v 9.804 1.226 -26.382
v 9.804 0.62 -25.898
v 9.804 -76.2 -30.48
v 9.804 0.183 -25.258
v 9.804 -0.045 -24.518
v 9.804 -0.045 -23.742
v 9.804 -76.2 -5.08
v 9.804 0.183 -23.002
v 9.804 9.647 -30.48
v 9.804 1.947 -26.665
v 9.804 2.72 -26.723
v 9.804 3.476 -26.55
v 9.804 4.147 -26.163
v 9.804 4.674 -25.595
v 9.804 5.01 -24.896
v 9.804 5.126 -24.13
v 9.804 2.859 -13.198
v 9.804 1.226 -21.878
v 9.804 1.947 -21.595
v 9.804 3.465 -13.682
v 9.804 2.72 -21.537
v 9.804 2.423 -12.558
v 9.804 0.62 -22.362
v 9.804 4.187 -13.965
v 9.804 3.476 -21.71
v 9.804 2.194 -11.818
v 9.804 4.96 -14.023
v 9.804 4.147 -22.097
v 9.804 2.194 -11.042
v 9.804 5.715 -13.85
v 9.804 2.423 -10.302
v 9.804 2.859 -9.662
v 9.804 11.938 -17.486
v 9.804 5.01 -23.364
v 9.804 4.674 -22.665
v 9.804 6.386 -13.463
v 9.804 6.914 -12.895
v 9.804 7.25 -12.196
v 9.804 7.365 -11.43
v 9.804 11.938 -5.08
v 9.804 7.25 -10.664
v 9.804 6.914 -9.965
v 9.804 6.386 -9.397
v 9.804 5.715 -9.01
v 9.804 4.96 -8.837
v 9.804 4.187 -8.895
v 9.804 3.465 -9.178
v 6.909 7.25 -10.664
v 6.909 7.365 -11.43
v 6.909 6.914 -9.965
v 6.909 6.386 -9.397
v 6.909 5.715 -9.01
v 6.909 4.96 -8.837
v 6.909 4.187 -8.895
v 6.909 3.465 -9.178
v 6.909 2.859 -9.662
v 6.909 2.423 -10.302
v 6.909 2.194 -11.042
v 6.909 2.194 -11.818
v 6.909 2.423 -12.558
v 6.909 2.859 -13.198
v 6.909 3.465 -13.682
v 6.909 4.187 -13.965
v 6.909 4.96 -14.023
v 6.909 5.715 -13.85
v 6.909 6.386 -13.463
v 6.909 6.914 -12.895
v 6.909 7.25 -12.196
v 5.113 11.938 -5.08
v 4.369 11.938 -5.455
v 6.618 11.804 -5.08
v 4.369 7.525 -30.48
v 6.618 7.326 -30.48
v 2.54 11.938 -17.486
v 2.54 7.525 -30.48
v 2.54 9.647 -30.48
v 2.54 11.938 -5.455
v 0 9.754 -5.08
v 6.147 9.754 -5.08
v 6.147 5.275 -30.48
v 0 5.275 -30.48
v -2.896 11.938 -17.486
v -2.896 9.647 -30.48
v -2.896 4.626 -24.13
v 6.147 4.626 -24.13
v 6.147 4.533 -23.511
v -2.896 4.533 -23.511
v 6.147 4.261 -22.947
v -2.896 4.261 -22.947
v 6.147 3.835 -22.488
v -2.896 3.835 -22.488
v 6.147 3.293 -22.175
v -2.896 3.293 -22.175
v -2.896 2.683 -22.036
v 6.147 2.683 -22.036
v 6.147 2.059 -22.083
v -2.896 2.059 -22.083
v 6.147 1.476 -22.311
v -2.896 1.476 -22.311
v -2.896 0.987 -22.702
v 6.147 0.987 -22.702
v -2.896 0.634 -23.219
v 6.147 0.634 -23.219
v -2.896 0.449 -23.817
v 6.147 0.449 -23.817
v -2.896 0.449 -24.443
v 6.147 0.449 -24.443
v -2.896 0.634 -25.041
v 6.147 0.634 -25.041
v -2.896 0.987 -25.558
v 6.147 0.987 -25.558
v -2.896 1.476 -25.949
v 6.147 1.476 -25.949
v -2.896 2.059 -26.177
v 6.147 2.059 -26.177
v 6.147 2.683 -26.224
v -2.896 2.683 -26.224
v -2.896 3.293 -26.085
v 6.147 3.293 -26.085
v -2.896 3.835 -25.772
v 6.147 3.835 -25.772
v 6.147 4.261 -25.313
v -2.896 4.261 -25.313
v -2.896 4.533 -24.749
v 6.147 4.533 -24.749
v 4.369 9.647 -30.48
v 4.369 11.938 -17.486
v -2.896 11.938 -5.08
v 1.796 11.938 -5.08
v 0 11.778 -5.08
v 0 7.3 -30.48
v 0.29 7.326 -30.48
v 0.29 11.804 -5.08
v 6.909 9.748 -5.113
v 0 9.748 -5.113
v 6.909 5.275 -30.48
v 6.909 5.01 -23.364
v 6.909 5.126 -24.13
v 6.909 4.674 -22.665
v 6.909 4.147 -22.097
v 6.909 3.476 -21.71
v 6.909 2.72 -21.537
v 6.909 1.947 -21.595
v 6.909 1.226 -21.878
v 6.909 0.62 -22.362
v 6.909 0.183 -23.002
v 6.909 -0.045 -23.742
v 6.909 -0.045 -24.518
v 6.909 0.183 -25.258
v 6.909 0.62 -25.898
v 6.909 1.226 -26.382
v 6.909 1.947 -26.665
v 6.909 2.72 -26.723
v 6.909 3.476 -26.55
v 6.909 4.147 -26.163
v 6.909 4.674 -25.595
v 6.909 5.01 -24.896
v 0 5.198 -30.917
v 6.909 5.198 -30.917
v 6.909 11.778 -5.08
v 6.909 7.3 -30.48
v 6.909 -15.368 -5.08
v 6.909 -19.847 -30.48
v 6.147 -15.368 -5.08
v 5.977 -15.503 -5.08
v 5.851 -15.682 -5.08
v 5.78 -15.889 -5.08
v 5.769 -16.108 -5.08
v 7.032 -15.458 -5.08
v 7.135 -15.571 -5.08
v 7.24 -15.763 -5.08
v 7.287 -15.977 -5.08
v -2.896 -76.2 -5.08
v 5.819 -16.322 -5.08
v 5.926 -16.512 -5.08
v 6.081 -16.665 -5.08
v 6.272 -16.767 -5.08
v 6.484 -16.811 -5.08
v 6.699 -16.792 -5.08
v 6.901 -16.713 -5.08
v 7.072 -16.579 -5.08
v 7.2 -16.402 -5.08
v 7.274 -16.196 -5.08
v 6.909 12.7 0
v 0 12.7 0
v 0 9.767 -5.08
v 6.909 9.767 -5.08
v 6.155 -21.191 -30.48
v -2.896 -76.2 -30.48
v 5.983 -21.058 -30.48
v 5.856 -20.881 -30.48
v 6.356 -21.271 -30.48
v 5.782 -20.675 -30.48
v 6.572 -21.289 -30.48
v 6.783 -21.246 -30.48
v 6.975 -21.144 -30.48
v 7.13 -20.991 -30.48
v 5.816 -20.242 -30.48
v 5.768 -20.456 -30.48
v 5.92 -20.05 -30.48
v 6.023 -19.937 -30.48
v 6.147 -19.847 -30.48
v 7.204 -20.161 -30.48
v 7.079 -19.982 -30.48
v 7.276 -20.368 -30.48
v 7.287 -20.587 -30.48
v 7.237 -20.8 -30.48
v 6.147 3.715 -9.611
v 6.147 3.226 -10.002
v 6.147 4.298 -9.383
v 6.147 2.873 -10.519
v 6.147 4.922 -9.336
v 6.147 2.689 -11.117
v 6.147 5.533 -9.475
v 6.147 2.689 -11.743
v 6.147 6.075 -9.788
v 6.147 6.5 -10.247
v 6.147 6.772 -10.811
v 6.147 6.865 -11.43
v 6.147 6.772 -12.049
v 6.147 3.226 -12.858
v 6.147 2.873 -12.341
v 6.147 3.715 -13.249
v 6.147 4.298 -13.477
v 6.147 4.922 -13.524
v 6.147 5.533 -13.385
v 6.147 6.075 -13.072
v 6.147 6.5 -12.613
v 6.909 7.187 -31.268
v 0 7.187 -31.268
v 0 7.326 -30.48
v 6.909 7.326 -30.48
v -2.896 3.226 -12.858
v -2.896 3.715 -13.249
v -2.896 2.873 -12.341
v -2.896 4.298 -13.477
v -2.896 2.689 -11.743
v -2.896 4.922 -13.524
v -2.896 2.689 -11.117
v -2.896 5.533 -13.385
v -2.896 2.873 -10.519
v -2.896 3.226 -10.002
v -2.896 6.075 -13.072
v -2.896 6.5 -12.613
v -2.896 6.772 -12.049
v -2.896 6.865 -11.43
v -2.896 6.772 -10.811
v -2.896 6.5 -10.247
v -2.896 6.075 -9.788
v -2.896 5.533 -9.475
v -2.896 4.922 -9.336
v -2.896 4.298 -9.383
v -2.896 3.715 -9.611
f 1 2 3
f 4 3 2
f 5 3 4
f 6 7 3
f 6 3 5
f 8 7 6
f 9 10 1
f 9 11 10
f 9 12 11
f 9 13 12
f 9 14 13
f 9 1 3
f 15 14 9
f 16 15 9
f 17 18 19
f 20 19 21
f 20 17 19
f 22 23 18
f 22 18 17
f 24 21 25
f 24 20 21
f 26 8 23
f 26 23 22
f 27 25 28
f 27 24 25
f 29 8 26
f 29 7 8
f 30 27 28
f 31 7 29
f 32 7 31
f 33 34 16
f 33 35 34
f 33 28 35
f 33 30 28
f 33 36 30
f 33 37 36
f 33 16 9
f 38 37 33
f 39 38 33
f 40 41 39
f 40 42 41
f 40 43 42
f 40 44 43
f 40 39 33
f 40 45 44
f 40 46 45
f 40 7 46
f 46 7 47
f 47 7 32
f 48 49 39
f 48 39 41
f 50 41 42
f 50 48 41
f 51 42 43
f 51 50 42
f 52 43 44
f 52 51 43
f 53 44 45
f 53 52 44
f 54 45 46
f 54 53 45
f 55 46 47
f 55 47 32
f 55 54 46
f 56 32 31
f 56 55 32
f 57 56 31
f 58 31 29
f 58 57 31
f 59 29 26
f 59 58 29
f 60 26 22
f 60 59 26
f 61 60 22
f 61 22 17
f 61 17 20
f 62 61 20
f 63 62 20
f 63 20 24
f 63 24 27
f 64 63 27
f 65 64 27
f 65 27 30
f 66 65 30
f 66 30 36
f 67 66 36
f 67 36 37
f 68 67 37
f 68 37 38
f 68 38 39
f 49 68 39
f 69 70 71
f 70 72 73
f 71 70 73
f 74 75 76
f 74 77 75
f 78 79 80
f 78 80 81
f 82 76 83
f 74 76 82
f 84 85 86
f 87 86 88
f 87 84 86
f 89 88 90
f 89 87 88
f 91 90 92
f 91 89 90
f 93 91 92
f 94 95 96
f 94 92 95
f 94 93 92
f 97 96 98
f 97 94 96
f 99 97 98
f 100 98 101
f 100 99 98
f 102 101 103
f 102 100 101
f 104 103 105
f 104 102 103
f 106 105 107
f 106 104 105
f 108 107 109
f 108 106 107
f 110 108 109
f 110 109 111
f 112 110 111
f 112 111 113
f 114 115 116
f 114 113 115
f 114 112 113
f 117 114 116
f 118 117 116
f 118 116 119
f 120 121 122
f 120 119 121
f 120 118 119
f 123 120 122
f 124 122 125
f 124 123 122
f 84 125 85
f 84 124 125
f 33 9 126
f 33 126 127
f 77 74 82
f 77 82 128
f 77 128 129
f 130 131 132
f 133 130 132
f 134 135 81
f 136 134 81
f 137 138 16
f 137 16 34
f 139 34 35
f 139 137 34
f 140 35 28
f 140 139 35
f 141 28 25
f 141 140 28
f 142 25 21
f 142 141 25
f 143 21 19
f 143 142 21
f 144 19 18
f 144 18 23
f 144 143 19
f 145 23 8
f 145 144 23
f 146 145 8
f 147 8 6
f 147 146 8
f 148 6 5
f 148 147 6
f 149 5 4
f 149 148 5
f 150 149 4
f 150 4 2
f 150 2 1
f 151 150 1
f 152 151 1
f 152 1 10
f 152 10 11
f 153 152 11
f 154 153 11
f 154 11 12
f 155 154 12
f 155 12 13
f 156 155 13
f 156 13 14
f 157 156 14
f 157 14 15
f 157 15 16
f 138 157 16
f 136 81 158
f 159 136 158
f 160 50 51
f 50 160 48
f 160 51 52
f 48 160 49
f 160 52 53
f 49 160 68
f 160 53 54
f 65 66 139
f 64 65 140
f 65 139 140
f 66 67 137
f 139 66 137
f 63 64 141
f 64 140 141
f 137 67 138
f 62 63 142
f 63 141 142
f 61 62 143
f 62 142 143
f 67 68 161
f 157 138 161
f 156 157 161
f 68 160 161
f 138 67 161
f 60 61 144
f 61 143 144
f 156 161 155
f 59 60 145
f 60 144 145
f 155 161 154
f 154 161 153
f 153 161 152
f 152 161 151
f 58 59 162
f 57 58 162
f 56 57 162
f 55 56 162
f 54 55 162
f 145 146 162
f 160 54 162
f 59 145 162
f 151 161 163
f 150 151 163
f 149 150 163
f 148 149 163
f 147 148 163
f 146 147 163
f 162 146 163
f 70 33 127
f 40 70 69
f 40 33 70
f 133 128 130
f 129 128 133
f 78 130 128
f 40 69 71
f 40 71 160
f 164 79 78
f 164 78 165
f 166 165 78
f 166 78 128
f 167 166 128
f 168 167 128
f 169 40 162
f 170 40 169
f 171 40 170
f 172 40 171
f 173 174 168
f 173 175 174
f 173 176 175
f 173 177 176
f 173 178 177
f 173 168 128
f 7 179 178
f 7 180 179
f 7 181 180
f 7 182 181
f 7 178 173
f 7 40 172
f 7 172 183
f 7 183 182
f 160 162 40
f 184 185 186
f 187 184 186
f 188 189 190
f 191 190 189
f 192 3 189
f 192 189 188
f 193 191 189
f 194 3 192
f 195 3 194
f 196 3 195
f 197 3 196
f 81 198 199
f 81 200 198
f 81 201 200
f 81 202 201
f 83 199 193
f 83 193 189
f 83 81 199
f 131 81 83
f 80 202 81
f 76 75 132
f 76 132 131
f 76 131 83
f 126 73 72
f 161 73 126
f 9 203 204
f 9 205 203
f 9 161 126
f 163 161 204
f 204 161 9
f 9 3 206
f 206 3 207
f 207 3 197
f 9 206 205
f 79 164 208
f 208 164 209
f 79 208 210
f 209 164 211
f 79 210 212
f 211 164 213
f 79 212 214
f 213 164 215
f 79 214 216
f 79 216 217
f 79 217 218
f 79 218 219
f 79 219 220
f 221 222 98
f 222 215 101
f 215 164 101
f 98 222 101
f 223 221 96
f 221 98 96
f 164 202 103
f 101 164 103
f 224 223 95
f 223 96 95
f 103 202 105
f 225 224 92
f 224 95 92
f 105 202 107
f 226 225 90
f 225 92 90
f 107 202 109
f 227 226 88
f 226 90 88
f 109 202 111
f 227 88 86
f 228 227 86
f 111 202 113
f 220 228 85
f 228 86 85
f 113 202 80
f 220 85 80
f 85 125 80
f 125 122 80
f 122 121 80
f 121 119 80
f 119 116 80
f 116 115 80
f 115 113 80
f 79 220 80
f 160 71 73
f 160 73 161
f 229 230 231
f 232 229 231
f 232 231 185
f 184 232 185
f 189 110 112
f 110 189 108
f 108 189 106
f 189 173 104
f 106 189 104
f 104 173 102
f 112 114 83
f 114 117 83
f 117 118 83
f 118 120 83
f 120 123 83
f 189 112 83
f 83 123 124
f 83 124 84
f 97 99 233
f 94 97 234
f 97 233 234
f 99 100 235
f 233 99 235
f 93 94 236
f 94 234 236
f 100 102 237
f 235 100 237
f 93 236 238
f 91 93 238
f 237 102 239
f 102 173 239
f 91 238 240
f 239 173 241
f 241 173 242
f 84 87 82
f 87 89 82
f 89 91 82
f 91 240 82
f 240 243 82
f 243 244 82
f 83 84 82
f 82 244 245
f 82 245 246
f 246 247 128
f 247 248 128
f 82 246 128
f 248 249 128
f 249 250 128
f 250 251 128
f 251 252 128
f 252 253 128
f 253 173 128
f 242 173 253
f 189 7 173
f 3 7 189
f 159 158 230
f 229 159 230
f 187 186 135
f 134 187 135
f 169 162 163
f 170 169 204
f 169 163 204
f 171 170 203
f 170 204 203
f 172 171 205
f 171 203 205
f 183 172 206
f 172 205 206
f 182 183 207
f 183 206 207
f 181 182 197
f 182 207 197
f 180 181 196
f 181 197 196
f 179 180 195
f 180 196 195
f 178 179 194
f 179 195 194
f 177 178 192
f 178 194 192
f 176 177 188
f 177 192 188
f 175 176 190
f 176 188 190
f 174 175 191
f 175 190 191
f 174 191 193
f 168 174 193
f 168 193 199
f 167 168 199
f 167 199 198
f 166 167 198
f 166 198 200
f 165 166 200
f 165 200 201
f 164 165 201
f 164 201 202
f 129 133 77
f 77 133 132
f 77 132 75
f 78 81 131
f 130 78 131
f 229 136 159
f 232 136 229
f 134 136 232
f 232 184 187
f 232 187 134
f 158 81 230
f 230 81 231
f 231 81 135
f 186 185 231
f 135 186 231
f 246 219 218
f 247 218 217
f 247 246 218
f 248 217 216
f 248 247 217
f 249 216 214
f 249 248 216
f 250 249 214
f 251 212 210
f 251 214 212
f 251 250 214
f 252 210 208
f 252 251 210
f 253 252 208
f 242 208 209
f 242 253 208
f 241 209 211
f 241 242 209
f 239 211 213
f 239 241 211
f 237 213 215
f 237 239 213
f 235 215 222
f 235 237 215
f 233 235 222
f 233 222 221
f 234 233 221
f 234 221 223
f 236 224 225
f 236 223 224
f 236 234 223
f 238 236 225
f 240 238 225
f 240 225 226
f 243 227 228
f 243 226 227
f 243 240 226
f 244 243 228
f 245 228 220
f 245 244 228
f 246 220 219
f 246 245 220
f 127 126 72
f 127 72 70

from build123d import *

# Parameters (mm, degrees)
F1_DEPTH      = 6.9088
F0_R          = 2.6
F0_R_2        = 2.1
F2_DEPTH      = 9.8044
F2_DEPTH_BACK = 2.8956
F4_DEPTH      = 31.751
F4_DEPTH_BACK = 14.4809433496
F5_R          = 2.6
F5_R_2        = 2.1
F6_DEPTH      = 3.6576


with BuildPart() as f1:
    # F0 (on Right) → F1 (new body)
    with BuildSketch(Plane.YZ):
        Polygon((7.325553628, -30.48), (11.804258938, -5.08), (9.7670606325, -5.08), (9.7479808874, -5.113047088), (5.2751026706, -30.48), align=None)
        Polygon((11.804258938, -5.08), (12.7, 0), (9.7670606325, -5.08), align=None)
        Polygon((7.1866703591, -31.2676461581), (7.325553628, -30.48), (5.2751026706, -30.48), (5.1980480634, -30.916998393), align=None)
    extrude(amount=F1_DEPTH)


with BuildPart() as f2:
    # F0 (on Right) → F2 (new body, two sides)
    with BuildSketch(Plane.YZ) as f2_sk:
        Polygon((11.938, -5.08), (11.804258938, -5.08), (7.325553628, -30.48), (9.6468188628, -30.48), (11.938, -17.486066071), align=None)
        Polygon((7.325553628, -30.48), (11.804258938, -5.08), (9.7670606325, -5.08), (9.7479808874, -5.113047088), (5.2751026706, -30.48), align=None)
        Polygon((9.7479808874, -5.113047088), (9.7670606325, -5.08), (-76.2, -5.08), (-76.2, -30.48), (5.2751026706, -30.48), align=None)
        with Locations((2.5260036068, -24.13)):
            Circle(F0_R, mode=Mode.SUBTRACT)
        with Locations((4.7653562618, -11.43)):
            Circle(F0_R, mode=Mode.SUBTRACT)
        with Locations((2.5260036068, -24.13)):
            Circle(F0_R)
        with Locations((2.5260036068, -24.13)):
            Circle(F0_R_2, mode=Mode.SUBTRACT)
        with Locations((4.7653562618, -11.43)):
            Circle(F0_R)
        with Locations((4.7653562618, -11.43)):
            Circle(F0_R_2, mode=Mode.SUBTRACT)
    extrude(amount=F2_DEPTH)
    extrude(f2_sk.sketch, amount=-F2_DEPTH_BACK)

    # F3 (on face) → F4 (cut, two sides)
    with BuildSketch(Plane(origin=(0, -5.1303777829, -29.095818248), x_dir=(1, 0, 0), z_dir=(0, -0.1736481777, -0.984807753))) as f4_sk:
        Polygon((6.1468, -10.4877584633), (0, -10.4877584633), (0, -12.4816584633), (0.2903233285, -12.5070584633), (6.6184766715, -12.5070584633), (6.9088, -12.4816584633), (6.9088, -10.4877584633), align=None)
        Polygon((6.6184766715, -12.5070584633), (0.2903233285, -12.5070584633), (2.54, -12.7038796686), (2.54, -14.7930584633), (4.3688, -14.7930584633), (4.3688, -12.7038796686), align=None)
        with BuildLine():
            Line((6.1468, 14.2523301791), (6.1468, -10.4877584633))
            Line((6.1468, -10.4877584633), (6.9088, -10.4877584633))
            Line((6.9088, -10.4877584633), (6.9088, 14.2523301791))
            ThreePointArc((6.9088, 14.2523301791), (6.5278, 15.6742415367), (6.1468, 14.2523301791))
        make_face()
    extrude(amount=-F4_DEPTH, mode=Mode.SUBTRACT)
    extrude(f4_sk.sketch, amount=F4_DEPTH_BACK, mode=Mode.SUBTRACT)

    # F5 (on face) → F6 (cut, through all)
    with BuildSketch(Plane.YZ.offset(6.1468)):
        with Locations((4.7653562618, -11.43)):
            Circle(F5_R)
        with Locations((4.7653562618, -11.43)):
            Circle(F5_R_2, mode=Mode.SUBTRACT)
        with Locations((2.5260036068, -24.13)):
            Circle(F5_R)
        with Locations((2.5260036068, -24.13)):
            Circle(F5_R_2, mode=Mode.SUBTRACT)
    extrude(amount=F6_DEPTH, mode=Mode.SUBTRACT)


solid = Compound([f1.part, f2.part])
